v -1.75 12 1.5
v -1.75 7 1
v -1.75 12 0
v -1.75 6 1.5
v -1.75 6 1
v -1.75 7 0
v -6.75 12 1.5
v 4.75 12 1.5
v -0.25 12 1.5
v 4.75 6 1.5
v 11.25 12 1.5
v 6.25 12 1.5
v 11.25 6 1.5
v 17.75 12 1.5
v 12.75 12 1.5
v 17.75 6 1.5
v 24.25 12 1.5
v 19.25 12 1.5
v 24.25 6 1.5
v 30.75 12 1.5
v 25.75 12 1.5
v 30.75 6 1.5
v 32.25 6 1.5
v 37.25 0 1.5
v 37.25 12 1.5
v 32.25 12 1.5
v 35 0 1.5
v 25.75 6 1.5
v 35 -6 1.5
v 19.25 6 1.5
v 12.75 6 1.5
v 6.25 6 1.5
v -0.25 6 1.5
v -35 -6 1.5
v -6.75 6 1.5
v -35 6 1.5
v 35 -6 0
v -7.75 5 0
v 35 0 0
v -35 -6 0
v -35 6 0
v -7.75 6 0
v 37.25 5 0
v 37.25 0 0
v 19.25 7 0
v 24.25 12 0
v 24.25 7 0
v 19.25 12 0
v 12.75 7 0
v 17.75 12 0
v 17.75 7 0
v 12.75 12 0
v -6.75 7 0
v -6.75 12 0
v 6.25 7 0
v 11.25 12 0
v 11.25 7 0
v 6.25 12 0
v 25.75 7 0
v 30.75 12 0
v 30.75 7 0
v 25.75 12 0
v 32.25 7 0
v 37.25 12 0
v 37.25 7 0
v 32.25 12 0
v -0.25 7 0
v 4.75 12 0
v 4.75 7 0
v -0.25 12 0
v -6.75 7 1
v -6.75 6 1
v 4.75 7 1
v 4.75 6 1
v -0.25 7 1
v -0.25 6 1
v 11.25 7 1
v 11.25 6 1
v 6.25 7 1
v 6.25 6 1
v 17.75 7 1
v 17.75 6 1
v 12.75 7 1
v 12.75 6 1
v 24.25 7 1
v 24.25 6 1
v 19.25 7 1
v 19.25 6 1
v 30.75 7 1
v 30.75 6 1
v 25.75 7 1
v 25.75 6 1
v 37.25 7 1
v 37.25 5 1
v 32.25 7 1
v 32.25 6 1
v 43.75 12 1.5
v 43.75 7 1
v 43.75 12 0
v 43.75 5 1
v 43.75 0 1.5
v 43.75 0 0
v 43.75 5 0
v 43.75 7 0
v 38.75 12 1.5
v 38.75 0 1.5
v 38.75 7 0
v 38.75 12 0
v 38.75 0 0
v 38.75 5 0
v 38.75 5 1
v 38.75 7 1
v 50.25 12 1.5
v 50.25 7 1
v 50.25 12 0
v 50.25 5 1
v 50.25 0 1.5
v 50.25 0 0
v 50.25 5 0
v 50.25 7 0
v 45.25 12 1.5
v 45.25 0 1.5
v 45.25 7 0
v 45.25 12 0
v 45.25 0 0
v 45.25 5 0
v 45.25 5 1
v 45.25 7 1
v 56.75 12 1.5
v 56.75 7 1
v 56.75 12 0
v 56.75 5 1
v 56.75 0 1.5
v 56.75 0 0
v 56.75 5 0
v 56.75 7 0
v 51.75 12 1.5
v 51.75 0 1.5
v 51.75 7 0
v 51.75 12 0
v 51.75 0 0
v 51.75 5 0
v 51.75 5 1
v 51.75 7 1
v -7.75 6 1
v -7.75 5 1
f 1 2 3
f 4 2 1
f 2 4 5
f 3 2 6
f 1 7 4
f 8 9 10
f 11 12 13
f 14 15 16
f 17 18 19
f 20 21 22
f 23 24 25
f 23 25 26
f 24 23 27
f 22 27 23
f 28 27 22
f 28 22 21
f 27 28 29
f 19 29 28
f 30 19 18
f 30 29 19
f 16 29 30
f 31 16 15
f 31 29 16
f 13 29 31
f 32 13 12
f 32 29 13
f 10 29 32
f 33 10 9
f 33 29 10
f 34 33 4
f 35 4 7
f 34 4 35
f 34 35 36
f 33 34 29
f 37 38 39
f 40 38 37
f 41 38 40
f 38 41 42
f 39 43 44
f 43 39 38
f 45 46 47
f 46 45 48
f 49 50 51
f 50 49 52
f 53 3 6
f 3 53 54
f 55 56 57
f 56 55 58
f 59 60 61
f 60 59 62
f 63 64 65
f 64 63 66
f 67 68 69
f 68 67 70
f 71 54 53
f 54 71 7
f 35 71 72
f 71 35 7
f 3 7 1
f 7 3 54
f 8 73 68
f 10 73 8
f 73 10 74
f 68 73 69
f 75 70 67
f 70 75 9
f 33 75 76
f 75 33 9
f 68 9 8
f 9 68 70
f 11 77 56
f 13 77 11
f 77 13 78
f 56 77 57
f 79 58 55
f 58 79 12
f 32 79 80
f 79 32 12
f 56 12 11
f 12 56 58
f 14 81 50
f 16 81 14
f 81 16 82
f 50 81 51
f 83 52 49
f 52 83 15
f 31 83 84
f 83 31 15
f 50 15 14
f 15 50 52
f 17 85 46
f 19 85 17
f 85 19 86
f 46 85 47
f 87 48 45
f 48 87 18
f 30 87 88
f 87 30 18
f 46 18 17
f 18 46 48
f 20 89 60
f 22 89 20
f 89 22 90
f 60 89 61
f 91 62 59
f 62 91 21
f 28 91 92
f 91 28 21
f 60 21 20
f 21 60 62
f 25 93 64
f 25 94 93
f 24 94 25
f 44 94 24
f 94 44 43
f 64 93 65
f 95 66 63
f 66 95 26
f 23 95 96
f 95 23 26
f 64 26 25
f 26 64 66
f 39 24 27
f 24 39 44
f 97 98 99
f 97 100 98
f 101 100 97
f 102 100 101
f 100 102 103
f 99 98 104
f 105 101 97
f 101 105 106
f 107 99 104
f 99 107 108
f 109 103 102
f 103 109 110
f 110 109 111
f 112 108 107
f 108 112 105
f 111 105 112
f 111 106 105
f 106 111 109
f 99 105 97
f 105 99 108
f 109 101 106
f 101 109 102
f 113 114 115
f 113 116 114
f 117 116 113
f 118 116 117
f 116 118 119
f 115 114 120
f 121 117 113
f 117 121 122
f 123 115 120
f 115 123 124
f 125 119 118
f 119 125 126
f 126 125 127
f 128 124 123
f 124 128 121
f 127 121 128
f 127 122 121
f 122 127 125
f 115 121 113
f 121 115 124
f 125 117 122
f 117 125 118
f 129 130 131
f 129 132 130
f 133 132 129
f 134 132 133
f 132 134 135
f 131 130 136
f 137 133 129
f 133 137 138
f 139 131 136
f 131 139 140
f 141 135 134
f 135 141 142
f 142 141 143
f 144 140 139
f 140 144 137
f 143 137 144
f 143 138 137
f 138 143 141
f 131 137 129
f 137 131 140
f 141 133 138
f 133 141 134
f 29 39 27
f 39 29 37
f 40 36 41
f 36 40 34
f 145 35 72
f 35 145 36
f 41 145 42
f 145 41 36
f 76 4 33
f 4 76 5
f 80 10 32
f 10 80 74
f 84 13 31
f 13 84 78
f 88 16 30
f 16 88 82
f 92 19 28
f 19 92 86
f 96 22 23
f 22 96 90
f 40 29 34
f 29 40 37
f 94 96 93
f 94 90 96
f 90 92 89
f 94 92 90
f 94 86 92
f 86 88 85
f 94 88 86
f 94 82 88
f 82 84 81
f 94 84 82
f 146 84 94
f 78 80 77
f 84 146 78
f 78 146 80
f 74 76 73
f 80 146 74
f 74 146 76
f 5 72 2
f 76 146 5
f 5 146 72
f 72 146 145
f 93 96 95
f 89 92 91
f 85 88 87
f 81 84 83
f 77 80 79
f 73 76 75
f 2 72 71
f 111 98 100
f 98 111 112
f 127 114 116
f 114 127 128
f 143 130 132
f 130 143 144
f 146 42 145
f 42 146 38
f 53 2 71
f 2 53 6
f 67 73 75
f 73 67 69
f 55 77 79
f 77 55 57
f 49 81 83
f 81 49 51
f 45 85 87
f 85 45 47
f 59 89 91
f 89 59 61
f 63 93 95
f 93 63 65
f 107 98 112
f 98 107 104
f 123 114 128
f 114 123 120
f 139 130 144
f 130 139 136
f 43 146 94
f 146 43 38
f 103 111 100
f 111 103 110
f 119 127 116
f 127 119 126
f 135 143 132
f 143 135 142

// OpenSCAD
// 10-well comb for agarose gel casting, printed lying flat
// Units: mm

$fn = 64;

// Spine (back bar)
spine_len   = 70;   // length along X
spine_wid   = 12;   // width along Y

// Teeth
tooth_count = 10;   // number of teeth
tooth_w     = 5.0;  // tooth width along X
tooth_l     = 12;   // tooth length along Y (hangs in -Y)
tooth_pitch = 1.5;  // gap between neighbouring teeth along X

// Plate
plate_t = 1.5;      // thickness along Z

// Derived
g = tooth_w + tooth_pitch;  // centre-to-centre spacing along X
x0 = -(tooth_count - 1) * tooth_pitch / 2;  // first tooth X position

difference() {
    union() {
        // Spine
        translate([-spine_len / 2, -spine_wid / 2, 0])
            cube([spine_len, spine_wid, plate_t]);

        // Teeth
        for (i = [0 : tooth_count - 1])
            translate([x0 + i * g, 0, 0])
                cube([tooth_w, tooth_l, plate_t]);
    }

    // Notch under each tooth (keeps the plate in one solid piece)
    for (i = [0 : tooth_count - 1])
        translate([x0 + i * g - 1, tooth_l / 2 - 1, -1])
            cube([tooth_w + 2, 2, 2]);
}
